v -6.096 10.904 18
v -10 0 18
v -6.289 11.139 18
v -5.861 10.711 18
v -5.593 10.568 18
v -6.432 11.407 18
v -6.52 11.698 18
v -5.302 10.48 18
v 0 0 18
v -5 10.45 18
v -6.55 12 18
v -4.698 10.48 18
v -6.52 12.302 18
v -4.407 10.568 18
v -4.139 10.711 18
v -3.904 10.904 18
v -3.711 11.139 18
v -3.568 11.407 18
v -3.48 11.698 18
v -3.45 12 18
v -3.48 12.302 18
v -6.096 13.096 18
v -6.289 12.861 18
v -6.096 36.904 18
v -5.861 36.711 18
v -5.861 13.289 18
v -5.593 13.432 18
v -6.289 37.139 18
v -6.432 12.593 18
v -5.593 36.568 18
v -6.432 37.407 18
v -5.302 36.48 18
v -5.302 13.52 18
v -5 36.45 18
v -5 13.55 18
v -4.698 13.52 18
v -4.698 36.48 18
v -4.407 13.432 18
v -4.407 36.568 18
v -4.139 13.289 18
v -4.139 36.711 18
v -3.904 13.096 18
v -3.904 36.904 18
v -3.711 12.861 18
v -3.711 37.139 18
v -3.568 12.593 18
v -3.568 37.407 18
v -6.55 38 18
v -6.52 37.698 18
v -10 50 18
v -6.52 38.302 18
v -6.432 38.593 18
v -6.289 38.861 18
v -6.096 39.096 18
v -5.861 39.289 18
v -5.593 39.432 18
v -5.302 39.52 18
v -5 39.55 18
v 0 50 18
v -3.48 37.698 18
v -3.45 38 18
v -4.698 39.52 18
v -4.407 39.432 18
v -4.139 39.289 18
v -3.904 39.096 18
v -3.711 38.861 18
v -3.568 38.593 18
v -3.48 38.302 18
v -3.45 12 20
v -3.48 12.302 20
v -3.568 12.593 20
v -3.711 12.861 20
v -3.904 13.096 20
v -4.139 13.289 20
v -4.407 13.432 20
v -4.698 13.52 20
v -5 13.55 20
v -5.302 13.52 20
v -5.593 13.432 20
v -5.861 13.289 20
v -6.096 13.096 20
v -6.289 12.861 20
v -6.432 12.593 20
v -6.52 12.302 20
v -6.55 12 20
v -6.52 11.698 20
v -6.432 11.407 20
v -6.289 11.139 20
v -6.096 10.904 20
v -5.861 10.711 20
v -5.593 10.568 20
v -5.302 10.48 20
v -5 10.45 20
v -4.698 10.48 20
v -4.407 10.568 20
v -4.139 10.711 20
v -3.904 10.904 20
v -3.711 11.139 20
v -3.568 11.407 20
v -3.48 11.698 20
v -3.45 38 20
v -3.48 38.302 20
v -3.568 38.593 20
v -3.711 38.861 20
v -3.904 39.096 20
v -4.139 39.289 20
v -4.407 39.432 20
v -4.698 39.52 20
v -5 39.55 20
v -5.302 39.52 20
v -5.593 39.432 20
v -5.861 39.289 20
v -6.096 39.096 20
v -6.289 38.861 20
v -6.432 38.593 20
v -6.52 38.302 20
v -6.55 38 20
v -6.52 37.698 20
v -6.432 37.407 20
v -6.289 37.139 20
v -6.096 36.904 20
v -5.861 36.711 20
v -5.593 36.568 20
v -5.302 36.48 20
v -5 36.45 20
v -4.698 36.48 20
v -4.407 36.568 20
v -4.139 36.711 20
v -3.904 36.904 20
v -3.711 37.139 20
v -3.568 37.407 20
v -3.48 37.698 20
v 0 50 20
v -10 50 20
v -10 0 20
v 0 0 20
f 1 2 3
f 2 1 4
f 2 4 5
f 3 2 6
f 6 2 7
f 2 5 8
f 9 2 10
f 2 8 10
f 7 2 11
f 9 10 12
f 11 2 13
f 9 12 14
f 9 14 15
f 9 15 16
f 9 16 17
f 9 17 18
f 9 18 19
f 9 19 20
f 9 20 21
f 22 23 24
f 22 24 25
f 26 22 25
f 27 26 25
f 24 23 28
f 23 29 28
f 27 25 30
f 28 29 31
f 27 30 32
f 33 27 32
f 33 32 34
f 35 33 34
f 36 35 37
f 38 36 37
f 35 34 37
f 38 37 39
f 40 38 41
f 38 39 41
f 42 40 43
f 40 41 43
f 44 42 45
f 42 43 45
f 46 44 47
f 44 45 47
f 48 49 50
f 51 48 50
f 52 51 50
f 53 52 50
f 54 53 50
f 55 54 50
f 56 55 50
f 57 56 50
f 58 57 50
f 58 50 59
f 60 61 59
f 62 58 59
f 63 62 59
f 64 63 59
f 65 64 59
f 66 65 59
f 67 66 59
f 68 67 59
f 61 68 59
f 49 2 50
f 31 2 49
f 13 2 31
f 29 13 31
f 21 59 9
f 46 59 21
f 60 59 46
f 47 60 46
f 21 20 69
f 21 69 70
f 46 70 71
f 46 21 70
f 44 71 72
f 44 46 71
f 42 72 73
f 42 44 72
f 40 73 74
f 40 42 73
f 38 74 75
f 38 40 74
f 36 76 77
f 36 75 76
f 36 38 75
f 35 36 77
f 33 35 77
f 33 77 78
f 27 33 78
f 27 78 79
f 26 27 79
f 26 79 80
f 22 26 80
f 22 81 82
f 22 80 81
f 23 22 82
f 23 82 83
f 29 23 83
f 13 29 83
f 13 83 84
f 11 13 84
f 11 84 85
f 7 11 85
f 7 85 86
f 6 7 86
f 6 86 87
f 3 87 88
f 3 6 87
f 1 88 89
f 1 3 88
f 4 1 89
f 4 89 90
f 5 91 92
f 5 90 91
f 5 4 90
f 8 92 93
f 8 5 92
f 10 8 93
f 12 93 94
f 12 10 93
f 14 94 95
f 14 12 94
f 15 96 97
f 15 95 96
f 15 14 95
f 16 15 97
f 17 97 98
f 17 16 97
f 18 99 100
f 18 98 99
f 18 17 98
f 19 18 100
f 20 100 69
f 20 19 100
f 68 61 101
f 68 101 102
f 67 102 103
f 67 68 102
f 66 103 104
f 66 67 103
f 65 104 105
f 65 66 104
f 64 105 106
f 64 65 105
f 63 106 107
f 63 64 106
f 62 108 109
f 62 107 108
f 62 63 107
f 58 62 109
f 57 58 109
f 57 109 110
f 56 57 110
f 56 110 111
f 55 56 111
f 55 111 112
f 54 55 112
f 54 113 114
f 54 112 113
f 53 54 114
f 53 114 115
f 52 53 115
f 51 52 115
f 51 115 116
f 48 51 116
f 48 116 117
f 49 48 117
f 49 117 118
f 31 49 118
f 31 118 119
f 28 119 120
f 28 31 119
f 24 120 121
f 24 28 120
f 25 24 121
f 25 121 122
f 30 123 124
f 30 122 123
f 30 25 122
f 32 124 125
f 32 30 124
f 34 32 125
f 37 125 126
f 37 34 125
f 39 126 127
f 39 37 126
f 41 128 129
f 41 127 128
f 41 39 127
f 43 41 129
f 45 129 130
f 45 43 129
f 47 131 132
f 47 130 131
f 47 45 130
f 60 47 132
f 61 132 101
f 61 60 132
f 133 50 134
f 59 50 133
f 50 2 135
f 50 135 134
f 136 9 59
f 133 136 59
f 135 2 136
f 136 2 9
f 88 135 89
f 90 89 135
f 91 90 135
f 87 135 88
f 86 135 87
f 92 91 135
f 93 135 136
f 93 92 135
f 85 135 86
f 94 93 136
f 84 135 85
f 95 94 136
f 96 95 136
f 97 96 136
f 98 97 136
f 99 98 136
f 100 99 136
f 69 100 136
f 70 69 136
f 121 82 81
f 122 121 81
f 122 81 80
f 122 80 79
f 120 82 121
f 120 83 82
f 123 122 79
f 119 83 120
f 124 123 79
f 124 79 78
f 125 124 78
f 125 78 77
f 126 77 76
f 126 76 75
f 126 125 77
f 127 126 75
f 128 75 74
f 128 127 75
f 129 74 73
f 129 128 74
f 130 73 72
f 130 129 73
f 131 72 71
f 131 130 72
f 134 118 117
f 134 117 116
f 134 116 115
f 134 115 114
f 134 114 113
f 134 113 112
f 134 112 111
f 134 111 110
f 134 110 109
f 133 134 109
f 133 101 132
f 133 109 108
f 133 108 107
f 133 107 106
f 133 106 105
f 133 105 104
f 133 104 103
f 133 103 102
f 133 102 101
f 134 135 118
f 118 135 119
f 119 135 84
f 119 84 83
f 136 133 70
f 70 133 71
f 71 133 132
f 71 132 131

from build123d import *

# Parameters (mm, degrees)
CYLINDER007_R     = 1.55
CYLINDER007_DEPTH = 10
CYLINDER006_R     = 1.55
CYLINDER006_DEPTH = 10
BOX003_W          = 10
BOX003_H          = 50
BOX003_DEPTH      = 2


with BuildPart() as cylinder007:
    # Cylinder007 → Cylinder007 (new body)
    with BuildSketch(Plane(origin=(-5, 38, 14), x_dir=(1, 0, 0), z_dir=(0, 0, 1))):
        Circle(CYLINDER007_R)
    extrude(amount=CYLINDER007_DEPTH)


with BuildPart() as cylinder006:
    # Cylinder006 → Cylinder006 (new body)
    with BuildSketch(Plane(origin=(-5, 12, 14), x_dir=(1, 0, 0), z_dir=(0, 0, 1))):
        Circle(CYLINDER006_R)
    extrude(amount=CYLINDER006_DEPTH)


with BuildPart() as lip018:
    # Box003 → Box003 (new body)
    with BuildSketch(Plane(origin=(-10, 0, 18), x_dir=(1, 0, 0), z_dir=(0, 0, 1))):
        with Locations((5, 25)):
            Rectangle(BOX003_W, BOX003_H)
    extrude(amount=BOX003_DEPTH)

    # Cut006: cut Cylinder006
    add(cylinder006.part, mode=Mode.SUBTRACT)

    # Cut007: cut Cylinder007
    add(cylinder007.part, mode=Mode.SUBTRACT)


solid = lip018.part
